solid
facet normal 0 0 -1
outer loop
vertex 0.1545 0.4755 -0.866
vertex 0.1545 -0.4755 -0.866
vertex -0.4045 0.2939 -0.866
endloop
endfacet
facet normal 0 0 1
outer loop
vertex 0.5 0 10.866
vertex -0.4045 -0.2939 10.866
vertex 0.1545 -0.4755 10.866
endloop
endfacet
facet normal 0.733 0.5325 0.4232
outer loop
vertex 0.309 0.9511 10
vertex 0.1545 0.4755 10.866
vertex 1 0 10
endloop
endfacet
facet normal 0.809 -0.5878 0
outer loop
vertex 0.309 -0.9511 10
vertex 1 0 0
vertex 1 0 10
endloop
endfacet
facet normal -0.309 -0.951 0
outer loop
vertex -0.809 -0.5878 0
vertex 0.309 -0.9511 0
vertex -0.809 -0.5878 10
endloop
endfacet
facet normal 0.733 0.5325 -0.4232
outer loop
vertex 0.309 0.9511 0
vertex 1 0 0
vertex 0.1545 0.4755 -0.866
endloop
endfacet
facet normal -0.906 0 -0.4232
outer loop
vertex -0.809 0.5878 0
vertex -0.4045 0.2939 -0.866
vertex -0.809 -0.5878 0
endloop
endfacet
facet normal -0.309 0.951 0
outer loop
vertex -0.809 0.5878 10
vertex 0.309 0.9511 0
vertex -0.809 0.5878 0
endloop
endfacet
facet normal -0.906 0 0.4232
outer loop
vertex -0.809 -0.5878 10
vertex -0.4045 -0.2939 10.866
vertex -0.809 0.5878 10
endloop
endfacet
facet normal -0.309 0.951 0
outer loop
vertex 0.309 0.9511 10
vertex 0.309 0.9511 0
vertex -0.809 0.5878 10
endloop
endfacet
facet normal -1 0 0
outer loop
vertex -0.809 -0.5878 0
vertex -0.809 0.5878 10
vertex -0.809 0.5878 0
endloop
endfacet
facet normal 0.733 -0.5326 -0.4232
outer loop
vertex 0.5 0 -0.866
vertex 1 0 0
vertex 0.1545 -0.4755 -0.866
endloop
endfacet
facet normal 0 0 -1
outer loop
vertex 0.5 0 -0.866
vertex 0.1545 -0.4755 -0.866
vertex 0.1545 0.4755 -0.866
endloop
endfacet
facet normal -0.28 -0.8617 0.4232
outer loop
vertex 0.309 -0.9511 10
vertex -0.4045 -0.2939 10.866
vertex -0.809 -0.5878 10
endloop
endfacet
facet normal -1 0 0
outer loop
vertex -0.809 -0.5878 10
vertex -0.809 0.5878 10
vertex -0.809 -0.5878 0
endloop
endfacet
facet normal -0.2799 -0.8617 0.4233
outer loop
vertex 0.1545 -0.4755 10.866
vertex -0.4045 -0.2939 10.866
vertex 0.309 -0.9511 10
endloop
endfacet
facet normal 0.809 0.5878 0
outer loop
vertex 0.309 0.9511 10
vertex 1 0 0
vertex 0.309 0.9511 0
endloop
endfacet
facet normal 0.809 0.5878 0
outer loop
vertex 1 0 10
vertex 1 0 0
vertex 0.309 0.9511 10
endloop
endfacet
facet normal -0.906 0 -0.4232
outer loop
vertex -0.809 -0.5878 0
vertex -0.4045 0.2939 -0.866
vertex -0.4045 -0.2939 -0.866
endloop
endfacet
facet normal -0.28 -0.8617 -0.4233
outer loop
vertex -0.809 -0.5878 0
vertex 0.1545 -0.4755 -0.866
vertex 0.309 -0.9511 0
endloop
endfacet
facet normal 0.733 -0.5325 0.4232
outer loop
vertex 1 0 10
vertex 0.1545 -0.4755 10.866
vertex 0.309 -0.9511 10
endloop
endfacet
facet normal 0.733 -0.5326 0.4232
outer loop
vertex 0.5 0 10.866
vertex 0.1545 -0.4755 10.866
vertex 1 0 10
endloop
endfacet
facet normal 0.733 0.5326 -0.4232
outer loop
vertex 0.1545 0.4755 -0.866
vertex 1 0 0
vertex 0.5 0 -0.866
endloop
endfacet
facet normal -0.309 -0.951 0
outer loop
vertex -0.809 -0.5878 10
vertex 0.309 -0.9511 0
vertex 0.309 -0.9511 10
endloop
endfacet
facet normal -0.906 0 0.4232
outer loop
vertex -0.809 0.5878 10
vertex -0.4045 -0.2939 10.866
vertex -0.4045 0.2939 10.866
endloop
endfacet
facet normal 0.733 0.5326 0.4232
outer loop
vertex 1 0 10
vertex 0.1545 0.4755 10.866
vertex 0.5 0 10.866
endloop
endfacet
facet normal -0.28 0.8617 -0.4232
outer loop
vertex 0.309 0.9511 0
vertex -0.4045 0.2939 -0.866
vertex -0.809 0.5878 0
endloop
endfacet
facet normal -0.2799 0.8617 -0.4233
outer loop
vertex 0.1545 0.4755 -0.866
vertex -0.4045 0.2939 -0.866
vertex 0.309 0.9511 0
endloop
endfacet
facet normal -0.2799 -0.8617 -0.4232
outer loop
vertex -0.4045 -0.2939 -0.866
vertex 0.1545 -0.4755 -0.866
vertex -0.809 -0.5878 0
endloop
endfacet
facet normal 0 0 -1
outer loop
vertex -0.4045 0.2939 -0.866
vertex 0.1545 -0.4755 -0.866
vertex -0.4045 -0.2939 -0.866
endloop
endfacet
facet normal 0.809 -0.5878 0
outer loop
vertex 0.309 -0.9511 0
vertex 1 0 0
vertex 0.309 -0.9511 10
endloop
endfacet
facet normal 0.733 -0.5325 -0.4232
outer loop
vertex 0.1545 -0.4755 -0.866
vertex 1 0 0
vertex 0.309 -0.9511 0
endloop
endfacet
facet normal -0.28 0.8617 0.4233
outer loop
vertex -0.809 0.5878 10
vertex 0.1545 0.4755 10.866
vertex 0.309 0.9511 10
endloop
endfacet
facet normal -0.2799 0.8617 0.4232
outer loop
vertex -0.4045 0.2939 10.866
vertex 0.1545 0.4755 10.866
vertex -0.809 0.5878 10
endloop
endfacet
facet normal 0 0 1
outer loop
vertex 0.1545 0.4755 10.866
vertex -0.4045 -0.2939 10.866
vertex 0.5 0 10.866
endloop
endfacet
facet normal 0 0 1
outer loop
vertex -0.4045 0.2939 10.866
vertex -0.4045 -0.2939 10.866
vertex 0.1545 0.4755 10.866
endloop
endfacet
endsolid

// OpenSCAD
line( );





module line(p1=[0,0,0,1],p2=[0,0,10,1])
{hull(){
translate([p1[0],p1[1],p1[2]])scale([p1[3]])sphere();
translate([p2[0],p2[1],p2[2]])scale([p2[3]])sphere();
}
}
